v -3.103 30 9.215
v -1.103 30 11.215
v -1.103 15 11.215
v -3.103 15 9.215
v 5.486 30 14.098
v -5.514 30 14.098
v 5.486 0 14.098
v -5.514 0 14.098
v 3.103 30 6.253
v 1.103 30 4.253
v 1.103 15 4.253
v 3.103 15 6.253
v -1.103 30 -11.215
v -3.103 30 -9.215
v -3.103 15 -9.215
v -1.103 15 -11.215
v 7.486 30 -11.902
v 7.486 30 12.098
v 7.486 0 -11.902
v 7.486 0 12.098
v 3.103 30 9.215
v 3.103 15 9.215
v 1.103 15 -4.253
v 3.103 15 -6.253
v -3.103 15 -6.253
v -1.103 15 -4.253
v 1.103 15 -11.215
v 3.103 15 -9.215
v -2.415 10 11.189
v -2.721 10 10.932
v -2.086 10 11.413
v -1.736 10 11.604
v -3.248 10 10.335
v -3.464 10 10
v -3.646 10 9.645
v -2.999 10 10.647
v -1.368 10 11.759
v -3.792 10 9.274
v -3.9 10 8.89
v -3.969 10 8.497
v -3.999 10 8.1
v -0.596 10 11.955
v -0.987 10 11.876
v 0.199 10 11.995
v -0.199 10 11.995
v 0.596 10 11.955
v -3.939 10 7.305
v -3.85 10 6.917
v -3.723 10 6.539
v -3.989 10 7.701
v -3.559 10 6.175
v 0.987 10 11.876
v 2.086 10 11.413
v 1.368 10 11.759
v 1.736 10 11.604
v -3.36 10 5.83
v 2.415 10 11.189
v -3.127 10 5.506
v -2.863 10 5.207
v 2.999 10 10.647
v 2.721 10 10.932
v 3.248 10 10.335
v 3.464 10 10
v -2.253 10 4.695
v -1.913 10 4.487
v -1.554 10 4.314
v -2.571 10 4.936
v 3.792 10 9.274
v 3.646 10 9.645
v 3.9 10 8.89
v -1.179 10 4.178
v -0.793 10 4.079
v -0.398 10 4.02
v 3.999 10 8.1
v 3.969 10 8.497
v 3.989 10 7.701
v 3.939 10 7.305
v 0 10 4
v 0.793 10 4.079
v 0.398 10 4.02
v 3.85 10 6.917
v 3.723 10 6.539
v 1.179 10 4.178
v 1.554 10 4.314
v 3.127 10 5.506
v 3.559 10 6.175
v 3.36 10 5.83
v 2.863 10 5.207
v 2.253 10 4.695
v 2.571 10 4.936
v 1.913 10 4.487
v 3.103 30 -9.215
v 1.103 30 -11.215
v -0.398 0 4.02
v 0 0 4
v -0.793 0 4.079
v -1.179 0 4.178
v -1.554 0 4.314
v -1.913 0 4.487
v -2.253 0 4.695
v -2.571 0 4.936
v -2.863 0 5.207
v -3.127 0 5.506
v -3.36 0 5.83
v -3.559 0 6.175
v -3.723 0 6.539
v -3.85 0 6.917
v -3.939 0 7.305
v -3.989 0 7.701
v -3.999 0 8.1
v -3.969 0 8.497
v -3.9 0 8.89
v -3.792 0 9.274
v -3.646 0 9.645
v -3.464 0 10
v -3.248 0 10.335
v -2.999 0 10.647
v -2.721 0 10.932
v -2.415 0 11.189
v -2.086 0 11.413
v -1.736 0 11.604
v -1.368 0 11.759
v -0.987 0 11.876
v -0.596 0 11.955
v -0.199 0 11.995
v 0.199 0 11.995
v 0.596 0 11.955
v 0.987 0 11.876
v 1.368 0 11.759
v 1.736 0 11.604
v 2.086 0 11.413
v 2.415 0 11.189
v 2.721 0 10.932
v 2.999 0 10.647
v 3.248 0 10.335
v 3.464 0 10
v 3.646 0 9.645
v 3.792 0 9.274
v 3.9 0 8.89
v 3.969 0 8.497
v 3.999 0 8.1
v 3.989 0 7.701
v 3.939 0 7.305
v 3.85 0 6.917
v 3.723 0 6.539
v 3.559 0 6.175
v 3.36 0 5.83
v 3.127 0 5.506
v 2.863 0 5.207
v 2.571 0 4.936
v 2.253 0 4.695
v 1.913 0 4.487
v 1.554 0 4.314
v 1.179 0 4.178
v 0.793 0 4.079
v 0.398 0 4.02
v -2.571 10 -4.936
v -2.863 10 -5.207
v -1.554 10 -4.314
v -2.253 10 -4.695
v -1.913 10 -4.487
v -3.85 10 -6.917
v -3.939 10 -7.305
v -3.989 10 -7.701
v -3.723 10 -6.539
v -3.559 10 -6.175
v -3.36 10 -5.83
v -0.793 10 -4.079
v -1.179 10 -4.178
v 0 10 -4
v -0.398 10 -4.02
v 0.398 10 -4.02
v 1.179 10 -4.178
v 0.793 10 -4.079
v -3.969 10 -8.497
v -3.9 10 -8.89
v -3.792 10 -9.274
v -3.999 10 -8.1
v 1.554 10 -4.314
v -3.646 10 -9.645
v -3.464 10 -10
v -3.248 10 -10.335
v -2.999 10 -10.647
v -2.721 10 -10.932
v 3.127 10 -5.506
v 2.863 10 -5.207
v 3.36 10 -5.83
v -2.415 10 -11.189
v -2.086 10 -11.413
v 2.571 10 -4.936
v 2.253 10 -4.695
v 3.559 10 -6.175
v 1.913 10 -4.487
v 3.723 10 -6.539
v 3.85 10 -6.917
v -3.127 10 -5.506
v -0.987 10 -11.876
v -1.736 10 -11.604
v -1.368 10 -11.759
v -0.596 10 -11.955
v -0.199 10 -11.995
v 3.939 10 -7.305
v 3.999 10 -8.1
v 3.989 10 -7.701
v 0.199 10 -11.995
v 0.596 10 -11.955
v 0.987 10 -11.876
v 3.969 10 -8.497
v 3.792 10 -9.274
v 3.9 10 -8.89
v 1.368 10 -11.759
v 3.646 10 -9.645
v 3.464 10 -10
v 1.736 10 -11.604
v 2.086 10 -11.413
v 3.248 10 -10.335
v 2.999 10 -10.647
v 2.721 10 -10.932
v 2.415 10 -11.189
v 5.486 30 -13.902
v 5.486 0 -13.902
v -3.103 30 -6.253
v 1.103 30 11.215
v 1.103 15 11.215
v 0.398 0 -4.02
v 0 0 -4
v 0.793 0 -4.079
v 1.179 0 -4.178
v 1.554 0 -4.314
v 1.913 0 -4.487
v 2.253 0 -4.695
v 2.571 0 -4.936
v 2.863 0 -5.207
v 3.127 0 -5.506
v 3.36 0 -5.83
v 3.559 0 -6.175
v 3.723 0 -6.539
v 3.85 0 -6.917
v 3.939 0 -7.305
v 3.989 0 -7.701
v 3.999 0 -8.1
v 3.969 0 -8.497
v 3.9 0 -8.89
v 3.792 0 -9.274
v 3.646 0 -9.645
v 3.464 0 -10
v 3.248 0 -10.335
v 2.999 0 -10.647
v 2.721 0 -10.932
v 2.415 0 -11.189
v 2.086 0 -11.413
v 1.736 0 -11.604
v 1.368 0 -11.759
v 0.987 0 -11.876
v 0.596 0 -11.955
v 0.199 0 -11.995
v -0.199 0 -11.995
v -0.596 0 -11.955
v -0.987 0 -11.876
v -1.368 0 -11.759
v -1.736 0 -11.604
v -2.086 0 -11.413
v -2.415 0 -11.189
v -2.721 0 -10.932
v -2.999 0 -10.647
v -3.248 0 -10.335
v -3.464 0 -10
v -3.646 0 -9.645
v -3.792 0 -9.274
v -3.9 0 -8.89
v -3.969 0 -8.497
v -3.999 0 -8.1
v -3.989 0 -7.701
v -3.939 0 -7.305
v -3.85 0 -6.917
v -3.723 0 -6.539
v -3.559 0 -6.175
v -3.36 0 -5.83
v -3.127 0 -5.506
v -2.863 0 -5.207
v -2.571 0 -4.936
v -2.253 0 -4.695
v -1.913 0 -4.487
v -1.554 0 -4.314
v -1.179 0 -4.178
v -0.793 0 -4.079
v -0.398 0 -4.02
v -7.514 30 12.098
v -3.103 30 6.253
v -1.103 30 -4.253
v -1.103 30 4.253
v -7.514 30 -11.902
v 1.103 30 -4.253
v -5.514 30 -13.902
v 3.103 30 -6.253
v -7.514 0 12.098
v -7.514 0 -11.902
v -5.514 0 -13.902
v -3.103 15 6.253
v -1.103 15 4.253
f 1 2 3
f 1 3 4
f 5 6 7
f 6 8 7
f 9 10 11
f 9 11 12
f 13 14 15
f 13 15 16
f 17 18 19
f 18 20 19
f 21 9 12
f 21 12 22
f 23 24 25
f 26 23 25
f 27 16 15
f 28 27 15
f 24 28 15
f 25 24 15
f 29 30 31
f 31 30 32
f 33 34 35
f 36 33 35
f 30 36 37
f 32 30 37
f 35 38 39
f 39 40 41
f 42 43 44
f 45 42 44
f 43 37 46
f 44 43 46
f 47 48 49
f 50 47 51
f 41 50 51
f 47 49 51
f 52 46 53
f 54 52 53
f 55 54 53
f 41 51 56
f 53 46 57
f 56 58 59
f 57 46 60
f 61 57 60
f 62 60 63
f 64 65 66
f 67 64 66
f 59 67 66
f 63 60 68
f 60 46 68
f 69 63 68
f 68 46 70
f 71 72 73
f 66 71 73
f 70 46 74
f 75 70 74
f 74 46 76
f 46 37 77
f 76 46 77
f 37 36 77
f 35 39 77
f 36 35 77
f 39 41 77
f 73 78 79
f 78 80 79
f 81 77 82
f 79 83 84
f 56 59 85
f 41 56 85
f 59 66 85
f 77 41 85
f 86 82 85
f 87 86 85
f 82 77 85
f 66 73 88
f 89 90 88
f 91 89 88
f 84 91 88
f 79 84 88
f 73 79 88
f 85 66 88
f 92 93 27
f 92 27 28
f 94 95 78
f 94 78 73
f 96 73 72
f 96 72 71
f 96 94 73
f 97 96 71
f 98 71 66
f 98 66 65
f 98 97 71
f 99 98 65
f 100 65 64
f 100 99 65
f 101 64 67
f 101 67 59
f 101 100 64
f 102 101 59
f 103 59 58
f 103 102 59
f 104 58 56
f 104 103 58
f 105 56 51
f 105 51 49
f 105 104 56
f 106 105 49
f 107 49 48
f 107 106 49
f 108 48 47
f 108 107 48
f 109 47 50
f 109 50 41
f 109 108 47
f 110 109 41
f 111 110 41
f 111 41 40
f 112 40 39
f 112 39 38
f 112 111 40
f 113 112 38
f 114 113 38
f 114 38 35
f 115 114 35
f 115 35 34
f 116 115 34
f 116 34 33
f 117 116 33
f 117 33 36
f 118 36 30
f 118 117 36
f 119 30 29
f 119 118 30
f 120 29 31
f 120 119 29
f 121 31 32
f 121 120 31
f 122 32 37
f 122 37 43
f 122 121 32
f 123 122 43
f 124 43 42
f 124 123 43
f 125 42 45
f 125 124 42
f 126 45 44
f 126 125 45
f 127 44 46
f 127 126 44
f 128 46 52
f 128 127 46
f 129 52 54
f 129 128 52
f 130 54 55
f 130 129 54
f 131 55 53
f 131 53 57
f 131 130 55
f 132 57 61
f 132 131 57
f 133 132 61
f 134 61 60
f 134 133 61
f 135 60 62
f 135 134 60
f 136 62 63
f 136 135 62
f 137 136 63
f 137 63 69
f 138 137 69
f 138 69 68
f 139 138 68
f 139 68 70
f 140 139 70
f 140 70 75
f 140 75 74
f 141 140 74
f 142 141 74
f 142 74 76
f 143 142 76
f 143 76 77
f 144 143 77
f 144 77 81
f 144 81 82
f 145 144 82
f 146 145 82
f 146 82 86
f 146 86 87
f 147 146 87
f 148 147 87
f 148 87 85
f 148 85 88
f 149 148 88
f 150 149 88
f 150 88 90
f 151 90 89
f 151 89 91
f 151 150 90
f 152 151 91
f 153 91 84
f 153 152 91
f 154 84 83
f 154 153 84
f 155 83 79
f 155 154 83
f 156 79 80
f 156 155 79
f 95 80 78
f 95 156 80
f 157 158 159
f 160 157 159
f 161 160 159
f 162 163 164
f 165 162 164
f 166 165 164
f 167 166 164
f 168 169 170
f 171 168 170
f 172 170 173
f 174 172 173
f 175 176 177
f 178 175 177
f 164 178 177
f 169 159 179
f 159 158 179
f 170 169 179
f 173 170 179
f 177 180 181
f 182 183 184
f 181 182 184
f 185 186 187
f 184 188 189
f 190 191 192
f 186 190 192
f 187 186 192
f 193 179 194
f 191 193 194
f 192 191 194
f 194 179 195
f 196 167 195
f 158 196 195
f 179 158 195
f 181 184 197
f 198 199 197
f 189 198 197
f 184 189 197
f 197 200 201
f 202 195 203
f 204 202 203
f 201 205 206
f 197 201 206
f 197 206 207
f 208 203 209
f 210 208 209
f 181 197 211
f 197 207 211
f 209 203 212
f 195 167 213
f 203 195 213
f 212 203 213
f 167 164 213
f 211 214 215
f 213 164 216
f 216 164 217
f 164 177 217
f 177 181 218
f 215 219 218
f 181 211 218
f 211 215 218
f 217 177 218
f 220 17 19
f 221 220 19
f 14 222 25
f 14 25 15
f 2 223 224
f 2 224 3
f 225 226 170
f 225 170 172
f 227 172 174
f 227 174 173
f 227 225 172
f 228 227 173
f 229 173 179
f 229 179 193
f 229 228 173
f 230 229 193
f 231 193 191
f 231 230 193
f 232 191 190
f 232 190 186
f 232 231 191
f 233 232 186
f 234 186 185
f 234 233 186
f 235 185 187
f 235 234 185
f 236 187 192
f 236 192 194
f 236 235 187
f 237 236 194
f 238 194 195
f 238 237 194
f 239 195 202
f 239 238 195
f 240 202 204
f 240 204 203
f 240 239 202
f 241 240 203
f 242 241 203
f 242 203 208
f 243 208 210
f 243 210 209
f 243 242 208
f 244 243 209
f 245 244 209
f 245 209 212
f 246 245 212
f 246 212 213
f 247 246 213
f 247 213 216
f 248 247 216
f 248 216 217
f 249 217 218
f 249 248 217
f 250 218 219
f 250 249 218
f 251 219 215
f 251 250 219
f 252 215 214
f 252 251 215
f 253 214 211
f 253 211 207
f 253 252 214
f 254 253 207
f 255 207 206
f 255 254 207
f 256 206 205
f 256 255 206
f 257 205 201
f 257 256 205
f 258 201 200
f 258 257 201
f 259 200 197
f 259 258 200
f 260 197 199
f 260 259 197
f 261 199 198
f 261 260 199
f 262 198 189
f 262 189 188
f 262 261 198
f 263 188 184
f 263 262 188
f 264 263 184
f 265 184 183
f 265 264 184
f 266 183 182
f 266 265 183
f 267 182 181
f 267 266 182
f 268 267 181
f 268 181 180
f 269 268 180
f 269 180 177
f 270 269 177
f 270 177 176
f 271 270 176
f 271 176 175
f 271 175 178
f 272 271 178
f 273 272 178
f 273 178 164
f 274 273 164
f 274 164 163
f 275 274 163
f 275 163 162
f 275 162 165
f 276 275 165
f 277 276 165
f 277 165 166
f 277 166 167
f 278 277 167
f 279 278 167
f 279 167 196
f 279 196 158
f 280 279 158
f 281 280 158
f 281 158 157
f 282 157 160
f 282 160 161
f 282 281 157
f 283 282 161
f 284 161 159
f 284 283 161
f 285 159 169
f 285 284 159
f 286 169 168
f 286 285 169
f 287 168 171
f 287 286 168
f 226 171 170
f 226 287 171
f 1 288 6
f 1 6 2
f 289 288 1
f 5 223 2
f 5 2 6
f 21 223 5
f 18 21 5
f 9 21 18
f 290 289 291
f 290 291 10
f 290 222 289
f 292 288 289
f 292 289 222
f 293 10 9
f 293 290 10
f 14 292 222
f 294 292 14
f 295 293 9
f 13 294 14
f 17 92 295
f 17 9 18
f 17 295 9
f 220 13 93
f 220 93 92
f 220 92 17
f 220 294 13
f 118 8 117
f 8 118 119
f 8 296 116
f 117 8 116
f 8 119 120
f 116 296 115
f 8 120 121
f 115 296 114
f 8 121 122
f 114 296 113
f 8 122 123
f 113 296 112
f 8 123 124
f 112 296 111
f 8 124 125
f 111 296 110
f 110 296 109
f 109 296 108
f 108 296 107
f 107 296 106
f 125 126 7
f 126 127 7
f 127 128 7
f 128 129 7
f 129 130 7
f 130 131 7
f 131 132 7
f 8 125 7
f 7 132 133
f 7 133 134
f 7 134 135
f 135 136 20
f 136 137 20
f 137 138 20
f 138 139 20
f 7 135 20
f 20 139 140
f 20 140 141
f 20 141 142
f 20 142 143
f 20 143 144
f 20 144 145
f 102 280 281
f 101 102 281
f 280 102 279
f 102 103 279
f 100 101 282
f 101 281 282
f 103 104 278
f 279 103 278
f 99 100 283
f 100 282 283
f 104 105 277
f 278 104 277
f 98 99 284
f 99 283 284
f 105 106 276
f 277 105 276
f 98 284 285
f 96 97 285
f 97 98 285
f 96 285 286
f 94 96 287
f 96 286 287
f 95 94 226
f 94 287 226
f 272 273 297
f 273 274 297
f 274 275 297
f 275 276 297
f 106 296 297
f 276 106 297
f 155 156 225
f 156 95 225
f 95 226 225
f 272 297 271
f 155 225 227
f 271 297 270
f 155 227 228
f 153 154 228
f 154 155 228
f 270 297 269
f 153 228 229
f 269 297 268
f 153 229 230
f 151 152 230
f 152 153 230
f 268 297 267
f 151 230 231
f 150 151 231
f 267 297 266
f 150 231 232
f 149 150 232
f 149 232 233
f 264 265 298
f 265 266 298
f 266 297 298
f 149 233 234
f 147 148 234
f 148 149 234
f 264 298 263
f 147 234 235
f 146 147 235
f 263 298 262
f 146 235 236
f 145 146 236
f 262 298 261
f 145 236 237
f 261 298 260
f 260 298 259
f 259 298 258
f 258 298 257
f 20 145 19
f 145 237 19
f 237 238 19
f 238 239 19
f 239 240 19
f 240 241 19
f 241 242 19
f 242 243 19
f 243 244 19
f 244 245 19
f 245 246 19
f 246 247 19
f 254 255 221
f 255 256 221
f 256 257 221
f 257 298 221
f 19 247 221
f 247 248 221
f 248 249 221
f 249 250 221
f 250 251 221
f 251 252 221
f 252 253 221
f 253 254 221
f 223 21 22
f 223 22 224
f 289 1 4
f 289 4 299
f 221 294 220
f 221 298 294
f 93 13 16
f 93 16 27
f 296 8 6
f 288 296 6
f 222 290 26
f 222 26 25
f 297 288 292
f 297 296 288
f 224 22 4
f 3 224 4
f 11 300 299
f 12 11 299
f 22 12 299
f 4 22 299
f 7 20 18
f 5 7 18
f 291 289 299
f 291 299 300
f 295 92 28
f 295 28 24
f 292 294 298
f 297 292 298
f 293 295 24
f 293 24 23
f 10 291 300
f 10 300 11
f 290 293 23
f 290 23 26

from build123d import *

# Parameters (mm, degrees)
SKETCH1_W           = 15
SKETCH1_H           = 28
SKETCH1_R           = 4
BOSS_EXTRUDE1_DEPTH = 10
SKETCH2_W           = 15
SKETCH2_H           = 28
BOSS_EXTRUDE2_DEPTH = 20
CUT_EXTRUDE1_DEPTH  = 15
CHAMFER1_SIZE       = 2


with BuildPart() as part:
    # Sketch1 → Boss-Extrude1 (new body)
    with BuildSketch(Plane(origin=(0, 0, 0), x_dir=(1, 0, 0), z_dir=(0, 1, 0))):
        with Locations((-0.01385015, -0.098387905)):
            Rectangle(SKETCH1_W, SKETCH1_H)
        with Locations(Location((0, 8, 0), (0, 0, 270))):
            Circle(SKETCH1_R, mode=Mode.SUBTRACT)
        with Locations(Location((0, -8, 0), (0, 0, 90))):
            Circle(SKETCH1_R, mode=Mode.SUBTRACT)
    extrude(amount=BOSS_EXTRUDE1_DEPTH)

    # Sketch2 → Boss-Extrude2 (add)
    with BuildSketch(Plane(origin=(0, 10, 0), x_dir=(1, 0, 0), z_dir=(0, 1, 0))):
        with Locations((-0.01385015, -0.098387905)):
            Rectangle(SKETCH2_W, SKETCH2_H)
    extrude(amount=BOSS_EXTRUDE2_DEPTH)

    # Sketch3 → Cut-Extrude1 (cut)
    with BuildSketch(Plane(origin=(0, 30, 0), x_dir=(1, 0, 0), z_dir=(0, 1, 0))):
        Polygon((-3.103489636, 9.215029418), (-1.103489636, 11.215029418), (1.103489636, 11.215029418), (3.103489636, 9.215029418), (3.103489636, 6.25292645), (1.103489636, 4.25292645), (-1.103489636, 4.25292645), (-3.103489636, 6.25292645), align=None)
        Polygon((-1.103489636, -4.25292645), (1.103489636, -4.25292645), (3.103489636, -6.25292645), (3.103489636, -9.215029418), (1.103489636, -11.215029418), (-1.103489636, -11.215029418), (-3.103489636, -9.215029418), (-3.103489636, -6.25292645), align=None)
    extrude(amount=-CUT_EXTRUDE1_DEPTH, mode=Mode.SUBTRACT)

    # Chamfer1
    chamfer1_edges = [part.edges().sort_by_distance(p)[0] for p in [
        (7.48614985, 15, 14.098387905),
        (-7.51385015, 15, 14.098387905),
        (-7.51385015, 15, -13.901612095),
        (7.48614985, 15, -13.901612095),
    ]]
    chamfer(chamfer1_edges, length=CHAMFER1_SIZE)


solid = part.part
